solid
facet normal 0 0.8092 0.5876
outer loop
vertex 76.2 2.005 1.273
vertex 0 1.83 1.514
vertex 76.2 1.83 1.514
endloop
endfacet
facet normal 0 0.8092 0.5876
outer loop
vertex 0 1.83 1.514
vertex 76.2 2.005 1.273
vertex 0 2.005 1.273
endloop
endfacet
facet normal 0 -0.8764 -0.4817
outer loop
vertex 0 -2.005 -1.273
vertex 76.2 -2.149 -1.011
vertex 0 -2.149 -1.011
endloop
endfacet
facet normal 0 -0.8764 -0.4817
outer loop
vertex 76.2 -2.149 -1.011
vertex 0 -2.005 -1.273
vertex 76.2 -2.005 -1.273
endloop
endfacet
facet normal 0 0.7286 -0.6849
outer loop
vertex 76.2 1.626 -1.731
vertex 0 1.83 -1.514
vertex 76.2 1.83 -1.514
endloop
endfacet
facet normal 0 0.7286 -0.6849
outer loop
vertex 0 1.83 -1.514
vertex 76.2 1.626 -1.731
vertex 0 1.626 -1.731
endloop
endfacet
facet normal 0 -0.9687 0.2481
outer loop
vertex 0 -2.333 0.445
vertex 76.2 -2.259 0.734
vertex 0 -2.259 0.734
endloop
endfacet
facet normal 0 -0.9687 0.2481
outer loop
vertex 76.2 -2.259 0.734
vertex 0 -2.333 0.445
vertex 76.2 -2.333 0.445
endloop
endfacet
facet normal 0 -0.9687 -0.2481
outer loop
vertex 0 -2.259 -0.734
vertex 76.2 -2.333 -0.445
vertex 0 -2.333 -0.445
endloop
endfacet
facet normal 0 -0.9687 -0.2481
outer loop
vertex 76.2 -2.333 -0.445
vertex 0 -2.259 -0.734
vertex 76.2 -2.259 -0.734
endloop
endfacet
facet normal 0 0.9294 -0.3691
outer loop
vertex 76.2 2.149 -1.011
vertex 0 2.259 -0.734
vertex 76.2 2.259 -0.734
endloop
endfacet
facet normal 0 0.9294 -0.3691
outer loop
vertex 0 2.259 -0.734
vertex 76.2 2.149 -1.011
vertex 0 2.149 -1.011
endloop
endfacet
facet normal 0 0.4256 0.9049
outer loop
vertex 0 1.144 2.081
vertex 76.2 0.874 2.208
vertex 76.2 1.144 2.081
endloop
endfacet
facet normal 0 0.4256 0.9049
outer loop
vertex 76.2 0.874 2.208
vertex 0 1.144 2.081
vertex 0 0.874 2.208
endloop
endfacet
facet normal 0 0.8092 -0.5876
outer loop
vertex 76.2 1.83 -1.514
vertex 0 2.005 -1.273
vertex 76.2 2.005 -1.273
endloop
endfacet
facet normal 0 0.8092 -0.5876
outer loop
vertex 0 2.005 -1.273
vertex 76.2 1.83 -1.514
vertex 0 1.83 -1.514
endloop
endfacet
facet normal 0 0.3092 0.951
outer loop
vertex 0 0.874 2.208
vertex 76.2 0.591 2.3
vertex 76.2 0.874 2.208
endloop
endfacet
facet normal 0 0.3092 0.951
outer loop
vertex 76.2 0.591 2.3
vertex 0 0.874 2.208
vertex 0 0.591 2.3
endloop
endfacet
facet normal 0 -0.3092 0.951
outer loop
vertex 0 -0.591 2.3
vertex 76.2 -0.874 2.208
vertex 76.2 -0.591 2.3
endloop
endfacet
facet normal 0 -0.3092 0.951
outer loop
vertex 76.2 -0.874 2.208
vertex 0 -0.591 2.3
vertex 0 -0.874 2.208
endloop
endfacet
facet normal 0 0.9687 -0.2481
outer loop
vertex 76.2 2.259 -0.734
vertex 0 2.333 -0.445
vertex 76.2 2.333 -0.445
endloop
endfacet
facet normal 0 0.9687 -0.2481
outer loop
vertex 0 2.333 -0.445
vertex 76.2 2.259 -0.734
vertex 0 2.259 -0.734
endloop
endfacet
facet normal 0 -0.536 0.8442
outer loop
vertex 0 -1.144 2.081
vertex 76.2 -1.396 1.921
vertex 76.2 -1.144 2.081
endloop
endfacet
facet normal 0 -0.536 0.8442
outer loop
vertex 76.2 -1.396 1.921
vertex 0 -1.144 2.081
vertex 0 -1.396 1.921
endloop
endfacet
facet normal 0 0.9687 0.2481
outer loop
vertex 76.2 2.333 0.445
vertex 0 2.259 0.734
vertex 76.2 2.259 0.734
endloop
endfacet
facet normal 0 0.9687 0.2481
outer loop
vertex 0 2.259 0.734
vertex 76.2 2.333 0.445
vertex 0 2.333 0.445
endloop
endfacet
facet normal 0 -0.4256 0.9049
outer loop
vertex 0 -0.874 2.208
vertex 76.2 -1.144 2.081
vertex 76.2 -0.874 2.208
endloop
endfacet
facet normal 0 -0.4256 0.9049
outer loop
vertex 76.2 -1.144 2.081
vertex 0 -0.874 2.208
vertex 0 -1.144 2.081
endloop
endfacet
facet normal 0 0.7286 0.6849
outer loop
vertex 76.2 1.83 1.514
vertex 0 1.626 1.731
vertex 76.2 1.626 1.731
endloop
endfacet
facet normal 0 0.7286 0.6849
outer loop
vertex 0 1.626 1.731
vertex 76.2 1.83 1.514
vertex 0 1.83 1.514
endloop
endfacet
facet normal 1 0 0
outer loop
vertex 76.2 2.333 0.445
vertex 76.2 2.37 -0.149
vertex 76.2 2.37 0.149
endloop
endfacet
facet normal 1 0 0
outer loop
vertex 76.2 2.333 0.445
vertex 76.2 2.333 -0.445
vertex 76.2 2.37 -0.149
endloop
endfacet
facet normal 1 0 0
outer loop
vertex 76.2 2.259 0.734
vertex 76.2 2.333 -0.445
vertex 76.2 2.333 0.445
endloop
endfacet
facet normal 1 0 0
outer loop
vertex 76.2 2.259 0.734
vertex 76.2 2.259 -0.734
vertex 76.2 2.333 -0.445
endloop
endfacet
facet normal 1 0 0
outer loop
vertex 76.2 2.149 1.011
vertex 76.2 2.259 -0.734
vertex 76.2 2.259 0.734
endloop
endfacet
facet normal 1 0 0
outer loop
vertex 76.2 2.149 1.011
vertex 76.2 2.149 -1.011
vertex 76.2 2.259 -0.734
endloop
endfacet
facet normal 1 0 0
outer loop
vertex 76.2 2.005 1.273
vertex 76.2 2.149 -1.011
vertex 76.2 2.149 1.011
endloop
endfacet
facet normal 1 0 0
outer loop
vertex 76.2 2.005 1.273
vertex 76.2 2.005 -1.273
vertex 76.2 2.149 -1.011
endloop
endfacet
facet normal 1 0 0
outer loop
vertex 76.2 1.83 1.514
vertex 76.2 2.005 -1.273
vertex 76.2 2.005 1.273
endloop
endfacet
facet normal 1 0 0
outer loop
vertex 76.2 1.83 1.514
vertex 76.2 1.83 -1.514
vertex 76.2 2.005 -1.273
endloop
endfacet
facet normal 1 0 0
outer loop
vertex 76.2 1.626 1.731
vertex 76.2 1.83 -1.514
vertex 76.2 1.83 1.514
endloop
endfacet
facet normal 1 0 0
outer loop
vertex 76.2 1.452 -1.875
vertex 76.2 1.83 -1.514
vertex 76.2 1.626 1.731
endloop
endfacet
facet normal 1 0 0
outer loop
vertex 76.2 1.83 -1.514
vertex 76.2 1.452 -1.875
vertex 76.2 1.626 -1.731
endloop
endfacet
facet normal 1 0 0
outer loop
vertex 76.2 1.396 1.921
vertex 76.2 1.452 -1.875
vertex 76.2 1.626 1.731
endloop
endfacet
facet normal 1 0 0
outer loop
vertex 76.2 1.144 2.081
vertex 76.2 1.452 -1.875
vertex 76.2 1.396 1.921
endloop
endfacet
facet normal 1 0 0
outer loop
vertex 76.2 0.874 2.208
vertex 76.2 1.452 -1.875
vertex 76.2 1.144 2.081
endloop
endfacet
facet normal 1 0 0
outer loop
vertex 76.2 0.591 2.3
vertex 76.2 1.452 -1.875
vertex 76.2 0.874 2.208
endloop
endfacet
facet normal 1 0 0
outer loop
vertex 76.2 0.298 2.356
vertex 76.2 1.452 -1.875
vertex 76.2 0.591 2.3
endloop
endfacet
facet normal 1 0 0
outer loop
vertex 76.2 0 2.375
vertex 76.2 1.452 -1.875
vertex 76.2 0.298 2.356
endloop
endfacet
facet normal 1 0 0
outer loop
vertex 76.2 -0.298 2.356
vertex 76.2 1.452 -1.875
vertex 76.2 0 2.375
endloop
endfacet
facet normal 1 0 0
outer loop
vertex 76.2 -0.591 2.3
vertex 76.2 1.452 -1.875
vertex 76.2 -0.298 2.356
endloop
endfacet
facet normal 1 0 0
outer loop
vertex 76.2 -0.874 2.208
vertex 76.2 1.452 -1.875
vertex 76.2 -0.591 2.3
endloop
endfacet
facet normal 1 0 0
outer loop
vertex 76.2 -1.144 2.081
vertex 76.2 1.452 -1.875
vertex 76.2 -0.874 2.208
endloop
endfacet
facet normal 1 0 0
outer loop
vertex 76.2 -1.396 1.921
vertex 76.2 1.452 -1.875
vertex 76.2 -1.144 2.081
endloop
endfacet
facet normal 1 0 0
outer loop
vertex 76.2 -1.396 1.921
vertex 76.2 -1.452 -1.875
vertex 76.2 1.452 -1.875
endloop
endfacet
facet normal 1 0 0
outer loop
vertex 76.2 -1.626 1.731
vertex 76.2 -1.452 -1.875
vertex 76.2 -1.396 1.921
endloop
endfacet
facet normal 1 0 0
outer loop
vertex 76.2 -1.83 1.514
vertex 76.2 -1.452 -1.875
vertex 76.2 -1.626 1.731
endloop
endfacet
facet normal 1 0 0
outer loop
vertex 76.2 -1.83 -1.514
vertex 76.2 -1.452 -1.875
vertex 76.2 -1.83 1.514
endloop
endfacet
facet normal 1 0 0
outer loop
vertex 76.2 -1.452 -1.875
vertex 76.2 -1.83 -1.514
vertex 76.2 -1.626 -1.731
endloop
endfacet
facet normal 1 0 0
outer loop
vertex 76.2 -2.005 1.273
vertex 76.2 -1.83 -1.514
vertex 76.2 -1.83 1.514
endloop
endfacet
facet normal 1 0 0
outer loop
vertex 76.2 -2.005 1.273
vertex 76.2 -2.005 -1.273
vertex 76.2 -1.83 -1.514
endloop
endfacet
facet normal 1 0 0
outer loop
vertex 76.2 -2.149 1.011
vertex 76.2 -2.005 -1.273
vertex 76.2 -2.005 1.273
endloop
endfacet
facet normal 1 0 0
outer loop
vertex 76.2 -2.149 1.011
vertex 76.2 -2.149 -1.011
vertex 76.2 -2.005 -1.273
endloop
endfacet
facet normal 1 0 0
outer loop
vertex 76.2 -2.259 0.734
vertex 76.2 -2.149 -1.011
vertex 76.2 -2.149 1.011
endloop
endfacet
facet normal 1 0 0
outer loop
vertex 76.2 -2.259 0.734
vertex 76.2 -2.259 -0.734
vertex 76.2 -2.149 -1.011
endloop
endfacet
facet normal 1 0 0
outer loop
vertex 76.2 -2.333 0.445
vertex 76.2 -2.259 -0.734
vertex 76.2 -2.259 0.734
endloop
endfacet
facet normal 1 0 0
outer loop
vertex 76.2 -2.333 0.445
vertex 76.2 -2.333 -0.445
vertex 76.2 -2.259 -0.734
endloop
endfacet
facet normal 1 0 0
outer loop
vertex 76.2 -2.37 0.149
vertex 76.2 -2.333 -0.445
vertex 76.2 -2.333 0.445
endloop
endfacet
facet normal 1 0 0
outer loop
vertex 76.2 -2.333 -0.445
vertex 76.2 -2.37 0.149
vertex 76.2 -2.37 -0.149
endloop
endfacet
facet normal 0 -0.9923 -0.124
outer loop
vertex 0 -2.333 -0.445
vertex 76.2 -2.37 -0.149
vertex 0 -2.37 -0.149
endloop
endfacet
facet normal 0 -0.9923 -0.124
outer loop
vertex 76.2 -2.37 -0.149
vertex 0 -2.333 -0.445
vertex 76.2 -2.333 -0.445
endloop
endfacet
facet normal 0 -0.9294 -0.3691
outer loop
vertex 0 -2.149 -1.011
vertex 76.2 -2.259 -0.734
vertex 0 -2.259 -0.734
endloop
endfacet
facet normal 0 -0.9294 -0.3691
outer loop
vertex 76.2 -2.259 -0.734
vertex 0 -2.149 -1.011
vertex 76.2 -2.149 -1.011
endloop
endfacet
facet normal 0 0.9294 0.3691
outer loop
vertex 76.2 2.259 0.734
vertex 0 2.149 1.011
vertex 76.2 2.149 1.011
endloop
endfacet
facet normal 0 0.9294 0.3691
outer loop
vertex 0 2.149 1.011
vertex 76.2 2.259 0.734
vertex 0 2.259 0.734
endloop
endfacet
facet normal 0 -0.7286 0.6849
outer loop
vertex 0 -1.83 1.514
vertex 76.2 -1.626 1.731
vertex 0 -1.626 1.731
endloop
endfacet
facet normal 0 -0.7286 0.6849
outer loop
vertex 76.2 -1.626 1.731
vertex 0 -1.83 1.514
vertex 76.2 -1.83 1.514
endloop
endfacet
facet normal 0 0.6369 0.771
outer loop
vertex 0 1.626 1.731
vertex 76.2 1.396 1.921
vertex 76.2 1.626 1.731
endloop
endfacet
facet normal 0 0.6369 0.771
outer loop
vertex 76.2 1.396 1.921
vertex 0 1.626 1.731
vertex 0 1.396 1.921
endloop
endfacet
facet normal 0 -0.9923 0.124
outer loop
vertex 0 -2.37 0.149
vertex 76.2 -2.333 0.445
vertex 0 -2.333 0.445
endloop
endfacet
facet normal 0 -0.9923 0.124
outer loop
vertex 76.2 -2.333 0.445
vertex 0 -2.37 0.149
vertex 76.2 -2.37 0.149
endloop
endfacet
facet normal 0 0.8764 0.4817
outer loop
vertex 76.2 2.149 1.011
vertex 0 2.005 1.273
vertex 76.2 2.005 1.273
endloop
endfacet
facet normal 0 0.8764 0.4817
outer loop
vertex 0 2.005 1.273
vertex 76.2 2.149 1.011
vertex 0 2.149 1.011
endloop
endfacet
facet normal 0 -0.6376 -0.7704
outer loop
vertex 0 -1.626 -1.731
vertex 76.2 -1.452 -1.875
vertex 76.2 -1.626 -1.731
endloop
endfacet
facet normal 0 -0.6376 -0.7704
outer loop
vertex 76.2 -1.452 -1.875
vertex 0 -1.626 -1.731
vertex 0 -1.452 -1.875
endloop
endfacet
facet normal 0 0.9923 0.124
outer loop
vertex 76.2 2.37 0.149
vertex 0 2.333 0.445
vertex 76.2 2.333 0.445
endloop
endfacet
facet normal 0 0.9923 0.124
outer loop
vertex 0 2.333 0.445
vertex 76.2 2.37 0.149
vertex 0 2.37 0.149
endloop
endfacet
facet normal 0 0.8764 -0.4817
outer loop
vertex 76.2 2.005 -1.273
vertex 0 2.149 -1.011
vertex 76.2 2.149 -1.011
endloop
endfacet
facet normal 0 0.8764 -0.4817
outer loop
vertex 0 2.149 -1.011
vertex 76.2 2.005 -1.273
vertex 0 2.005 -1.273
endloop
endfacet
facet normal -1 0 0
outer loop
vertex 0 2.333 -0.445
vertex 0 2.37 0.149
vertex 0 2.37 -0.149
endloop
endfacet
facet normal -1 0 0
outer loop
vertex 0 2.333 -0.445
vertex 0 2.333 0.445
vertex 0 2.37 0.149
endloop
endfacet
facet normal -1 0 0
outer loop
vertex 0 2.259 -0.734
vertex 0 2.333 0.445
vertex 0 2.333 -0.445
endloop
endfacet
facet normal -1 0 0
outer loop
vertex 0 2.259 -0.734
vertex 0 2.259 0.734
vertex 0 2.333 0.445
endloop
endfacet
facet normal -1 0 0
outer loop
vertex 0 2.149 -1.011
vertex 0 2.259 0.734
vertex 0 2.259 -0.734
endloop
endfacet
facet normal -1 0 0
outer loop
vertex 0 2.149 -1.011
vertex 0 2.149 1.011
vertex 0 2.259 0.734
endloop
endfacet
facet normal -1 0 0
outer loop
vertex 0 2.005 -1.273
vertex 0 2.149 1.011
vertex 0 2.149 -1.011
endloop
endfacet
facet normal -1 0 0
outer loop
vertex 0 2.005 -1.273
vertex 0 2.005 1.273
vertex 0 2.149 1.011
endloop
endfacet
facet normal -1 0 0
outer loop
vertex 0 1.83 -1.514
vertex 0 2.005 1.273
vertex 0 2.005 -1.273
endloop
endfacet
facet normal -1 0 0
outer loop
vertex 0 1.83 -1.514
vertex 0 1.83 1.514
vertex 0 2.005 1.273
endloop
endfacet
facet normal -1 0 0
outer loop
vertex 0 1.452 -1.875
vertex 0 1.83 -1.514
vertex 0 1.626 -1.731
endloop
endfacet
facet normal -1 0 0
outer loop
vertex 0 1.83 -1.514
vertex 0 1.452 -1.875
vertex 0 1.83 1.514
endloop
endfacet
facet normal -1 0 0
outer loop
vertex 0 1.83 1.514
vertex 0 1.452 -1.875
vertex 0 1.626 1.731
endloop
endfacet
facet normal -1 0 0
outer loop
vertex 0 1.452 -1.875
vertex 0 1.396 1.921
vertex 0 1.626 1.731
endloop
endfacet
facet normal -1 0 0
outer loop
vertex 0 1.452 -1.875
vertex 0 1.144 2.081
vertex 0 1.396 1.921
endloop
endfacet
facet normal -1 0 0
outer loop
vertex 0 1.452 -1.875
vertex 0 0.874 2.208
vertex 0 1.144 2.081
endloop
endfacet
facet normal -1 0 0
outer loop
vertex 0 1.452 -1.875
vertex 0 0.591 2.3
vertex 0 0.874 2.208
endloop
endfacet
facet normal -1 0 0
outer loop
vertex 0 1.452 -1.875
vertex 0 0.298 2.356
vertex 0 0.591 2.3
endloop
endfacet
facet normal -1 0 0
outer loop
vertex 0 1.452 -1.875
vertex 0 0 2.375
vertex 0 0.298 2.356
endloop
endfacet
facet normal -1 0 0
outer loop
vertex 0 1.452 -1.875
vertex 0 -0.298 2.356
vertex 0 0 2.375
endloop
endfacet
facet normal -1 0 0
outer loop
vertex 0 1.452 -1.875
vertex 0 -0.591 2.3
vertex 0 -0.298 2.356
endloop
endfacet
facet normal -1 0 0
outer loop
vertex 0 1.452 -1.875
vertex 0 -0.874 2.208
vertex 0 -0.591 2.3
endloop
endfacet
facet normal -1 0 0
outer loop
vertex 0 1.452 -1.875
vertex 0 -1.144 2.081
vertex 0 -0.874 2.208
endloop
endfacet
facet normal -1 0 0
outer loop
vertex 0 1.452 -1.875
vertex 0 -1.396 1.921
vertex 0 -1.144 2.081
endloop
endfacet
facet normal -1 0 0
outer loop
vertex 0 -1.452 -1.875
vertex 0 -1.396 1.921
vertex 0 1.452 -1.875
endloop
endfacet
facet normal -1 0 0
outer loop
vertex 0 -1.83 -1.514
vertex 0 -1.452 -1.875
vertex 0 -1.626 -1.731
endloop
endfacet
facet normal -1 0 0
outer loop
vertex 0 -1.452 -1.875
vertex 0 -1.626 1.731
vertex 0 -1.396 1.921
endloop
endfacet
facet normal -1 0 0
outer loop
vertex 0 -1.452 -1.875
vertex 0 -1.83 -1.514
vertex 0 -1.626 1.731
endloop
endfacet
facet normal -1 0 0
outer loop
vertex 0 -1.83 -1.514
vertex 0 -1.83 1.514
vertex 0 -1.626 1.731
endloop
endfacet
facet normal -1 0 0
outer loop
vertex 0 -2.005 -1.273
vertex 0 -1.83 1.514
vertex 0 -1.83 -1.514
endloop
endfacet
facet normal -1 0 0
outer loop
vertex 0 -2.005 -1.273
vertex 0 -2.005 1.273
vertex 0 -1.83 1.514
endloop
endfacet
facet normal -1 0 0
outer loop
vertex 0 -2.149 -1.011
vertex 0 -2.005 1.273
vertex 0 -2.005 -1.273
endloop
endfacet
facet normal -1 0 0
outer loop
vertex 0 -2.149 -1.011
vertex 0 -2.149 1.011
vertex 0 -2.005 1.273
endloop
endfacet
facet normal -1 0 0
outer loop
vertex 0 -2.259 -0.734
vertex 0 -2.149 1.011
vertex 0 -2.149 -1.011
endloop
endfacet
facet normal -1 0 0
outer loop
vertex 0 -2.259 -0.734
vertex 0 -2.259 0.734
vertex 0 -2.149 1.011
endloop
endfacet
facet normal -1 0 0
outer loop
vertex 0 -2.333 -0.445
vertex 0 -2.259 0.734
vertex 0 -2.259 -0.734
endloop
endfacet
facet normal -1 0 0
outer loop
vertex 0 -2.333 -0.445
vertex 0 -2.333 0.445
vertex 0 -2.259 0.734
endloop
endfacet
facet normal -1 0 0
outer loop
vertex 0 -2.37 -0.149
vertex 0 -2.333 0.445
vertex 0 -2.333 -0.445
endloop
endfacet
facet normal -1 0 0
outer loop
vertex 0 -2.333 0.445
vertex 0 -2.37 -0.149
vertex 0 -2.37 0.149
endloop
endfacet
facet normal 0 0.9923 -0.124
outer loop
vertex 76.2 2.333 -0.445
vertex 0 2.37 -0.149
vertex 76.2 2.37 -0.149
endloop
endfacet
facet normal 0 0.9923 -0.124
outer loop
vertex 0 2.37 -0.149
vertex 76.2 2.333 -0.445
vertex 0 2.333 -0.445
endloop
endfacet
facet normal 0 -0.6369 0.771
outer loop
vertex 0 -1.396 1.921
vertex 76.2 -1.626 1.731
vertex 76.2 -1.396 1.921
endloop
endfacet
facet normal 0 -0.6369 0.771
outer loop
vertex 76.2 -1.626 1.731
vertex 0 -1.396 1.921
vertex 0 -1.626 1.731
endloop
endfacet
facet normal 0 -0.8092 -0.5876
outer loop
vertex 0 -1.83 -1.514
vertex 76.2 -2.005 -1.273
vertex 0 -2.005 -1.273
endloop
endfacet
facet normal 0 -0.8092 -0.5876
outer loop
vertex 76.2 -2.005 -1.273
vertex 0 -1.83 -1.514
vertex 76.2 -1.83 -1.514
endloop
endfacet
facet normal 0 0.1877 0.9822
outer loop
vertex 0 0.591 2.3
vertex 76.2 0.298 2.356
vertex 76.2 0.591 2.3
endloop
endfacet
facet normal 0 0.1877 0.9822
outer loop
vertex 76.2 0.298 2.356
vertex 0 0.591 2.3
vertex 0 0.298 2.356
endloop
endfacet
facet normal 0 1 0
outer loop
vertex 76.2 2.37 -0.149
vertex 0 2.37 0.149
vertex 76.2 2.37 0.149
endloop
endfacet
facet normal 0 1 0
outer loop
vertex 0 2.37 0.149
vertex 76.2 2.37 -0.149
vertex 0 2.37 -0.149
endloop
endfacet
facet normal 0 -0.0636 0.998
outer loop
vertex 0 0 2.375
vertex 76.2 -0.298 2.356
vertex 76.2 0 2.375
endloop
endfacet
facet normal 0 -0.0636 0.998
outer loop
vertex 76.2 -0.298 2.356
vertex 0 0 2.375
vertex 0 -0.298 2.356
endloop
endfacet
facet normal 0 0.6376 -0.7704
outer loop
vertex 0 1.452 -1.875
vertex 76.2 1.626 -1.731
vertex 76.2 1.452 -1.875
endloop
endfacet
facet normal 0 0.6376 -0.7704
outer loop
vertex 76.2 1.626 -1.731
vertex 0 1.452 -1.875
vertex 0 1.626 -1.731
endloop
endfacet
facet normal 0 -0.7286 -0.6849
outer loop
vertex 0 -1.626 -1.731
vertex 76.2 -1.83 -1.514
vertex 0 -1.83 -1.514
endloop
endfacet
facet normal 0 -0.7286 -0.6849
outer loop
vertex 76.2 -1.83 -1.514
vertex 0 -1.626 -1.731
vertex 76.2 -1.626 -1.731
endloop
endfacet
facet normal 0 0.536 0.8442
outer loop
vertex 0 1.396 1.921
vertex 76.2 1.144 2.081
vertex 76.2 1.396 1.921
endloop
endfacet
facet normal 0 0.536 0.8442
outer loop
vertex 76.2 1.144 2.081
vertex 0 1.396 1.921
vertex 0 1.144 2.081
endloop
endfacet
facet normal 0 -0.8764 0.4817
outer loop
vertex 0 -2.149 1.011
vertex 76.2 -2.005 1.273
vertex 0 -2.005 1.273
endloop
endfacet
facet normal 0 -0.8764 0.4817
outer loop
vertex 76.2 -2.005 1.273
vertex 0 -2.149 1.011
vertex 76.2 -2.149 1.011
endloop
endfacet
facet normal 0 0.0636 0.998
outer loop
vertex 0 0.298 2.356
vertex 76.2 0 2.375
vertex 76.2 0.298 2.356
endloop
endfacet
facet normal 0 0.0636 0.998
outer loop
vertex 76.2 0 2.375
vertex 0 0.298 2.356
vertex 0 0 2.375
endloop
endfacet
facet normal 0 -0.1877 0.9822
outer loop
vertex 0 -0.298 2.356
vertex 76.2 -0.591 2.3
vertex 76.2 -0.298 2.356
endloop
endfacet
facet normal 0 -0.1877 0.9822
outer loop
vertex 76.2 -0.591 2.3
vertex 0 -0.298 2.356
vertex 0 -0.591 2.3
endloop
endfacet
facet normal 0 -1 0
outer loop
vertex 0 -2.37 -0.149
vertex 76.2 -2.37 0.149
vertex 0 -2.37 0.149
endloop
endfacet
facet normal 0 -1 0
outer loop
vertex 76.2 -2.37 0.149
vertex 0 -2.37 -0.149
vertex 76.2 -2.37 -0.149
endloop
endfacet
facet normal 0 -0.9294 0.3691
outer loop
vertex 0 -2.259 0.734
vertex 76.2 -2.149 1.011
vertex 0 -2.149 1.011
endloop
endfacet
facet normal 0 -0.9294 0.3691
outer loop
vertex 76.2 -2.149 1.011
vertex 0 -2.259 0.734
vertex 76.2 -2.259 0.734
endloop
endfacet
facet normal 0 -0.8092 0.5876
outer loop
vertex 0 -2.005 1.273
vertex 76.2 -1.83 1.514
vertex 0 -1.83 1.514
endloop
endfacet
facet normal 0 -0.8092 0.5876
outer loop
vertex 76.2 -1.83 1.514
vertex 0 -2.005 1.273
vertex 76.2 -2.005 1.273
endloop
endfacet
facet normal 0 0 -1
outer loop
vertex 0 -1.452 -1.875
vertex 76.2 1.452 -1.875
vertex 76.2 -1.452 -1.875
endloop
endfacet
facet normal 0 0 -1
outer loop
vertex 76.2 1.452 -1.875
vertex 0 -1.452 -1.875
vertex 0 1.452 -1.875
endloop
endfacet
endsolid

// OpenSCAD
mm=1;
cm=10;
in=25.4;
length=3*in;
diam=4.75*mm;
flat=0.5*mm;
module tetrix_shaft(length=10, orient=[0,0,0]) {
    //length = length of the shaft
    //orient = orientation of the shaft along the x, y , or z axis
    //         defaults to z axis, with flat on the positive x axis
    diam = 4.75; //diameter of the shaft
    flat = 0.5; //how big is the flat edge
    //translate([0, 0, diam/2-flat])
    rotate([0, 90*orient[1], 0])
    rotate([-90*orient[1],90*orient[0],0])
    difference() {
        cylinder(h=length, d=diam, center=false, $fn=50);
        translate([diam/2-flat, -diam/2, 0]) cube([flat, diam, length]);
    }
}

tetrix_shaft(length, [1,0,0]);
